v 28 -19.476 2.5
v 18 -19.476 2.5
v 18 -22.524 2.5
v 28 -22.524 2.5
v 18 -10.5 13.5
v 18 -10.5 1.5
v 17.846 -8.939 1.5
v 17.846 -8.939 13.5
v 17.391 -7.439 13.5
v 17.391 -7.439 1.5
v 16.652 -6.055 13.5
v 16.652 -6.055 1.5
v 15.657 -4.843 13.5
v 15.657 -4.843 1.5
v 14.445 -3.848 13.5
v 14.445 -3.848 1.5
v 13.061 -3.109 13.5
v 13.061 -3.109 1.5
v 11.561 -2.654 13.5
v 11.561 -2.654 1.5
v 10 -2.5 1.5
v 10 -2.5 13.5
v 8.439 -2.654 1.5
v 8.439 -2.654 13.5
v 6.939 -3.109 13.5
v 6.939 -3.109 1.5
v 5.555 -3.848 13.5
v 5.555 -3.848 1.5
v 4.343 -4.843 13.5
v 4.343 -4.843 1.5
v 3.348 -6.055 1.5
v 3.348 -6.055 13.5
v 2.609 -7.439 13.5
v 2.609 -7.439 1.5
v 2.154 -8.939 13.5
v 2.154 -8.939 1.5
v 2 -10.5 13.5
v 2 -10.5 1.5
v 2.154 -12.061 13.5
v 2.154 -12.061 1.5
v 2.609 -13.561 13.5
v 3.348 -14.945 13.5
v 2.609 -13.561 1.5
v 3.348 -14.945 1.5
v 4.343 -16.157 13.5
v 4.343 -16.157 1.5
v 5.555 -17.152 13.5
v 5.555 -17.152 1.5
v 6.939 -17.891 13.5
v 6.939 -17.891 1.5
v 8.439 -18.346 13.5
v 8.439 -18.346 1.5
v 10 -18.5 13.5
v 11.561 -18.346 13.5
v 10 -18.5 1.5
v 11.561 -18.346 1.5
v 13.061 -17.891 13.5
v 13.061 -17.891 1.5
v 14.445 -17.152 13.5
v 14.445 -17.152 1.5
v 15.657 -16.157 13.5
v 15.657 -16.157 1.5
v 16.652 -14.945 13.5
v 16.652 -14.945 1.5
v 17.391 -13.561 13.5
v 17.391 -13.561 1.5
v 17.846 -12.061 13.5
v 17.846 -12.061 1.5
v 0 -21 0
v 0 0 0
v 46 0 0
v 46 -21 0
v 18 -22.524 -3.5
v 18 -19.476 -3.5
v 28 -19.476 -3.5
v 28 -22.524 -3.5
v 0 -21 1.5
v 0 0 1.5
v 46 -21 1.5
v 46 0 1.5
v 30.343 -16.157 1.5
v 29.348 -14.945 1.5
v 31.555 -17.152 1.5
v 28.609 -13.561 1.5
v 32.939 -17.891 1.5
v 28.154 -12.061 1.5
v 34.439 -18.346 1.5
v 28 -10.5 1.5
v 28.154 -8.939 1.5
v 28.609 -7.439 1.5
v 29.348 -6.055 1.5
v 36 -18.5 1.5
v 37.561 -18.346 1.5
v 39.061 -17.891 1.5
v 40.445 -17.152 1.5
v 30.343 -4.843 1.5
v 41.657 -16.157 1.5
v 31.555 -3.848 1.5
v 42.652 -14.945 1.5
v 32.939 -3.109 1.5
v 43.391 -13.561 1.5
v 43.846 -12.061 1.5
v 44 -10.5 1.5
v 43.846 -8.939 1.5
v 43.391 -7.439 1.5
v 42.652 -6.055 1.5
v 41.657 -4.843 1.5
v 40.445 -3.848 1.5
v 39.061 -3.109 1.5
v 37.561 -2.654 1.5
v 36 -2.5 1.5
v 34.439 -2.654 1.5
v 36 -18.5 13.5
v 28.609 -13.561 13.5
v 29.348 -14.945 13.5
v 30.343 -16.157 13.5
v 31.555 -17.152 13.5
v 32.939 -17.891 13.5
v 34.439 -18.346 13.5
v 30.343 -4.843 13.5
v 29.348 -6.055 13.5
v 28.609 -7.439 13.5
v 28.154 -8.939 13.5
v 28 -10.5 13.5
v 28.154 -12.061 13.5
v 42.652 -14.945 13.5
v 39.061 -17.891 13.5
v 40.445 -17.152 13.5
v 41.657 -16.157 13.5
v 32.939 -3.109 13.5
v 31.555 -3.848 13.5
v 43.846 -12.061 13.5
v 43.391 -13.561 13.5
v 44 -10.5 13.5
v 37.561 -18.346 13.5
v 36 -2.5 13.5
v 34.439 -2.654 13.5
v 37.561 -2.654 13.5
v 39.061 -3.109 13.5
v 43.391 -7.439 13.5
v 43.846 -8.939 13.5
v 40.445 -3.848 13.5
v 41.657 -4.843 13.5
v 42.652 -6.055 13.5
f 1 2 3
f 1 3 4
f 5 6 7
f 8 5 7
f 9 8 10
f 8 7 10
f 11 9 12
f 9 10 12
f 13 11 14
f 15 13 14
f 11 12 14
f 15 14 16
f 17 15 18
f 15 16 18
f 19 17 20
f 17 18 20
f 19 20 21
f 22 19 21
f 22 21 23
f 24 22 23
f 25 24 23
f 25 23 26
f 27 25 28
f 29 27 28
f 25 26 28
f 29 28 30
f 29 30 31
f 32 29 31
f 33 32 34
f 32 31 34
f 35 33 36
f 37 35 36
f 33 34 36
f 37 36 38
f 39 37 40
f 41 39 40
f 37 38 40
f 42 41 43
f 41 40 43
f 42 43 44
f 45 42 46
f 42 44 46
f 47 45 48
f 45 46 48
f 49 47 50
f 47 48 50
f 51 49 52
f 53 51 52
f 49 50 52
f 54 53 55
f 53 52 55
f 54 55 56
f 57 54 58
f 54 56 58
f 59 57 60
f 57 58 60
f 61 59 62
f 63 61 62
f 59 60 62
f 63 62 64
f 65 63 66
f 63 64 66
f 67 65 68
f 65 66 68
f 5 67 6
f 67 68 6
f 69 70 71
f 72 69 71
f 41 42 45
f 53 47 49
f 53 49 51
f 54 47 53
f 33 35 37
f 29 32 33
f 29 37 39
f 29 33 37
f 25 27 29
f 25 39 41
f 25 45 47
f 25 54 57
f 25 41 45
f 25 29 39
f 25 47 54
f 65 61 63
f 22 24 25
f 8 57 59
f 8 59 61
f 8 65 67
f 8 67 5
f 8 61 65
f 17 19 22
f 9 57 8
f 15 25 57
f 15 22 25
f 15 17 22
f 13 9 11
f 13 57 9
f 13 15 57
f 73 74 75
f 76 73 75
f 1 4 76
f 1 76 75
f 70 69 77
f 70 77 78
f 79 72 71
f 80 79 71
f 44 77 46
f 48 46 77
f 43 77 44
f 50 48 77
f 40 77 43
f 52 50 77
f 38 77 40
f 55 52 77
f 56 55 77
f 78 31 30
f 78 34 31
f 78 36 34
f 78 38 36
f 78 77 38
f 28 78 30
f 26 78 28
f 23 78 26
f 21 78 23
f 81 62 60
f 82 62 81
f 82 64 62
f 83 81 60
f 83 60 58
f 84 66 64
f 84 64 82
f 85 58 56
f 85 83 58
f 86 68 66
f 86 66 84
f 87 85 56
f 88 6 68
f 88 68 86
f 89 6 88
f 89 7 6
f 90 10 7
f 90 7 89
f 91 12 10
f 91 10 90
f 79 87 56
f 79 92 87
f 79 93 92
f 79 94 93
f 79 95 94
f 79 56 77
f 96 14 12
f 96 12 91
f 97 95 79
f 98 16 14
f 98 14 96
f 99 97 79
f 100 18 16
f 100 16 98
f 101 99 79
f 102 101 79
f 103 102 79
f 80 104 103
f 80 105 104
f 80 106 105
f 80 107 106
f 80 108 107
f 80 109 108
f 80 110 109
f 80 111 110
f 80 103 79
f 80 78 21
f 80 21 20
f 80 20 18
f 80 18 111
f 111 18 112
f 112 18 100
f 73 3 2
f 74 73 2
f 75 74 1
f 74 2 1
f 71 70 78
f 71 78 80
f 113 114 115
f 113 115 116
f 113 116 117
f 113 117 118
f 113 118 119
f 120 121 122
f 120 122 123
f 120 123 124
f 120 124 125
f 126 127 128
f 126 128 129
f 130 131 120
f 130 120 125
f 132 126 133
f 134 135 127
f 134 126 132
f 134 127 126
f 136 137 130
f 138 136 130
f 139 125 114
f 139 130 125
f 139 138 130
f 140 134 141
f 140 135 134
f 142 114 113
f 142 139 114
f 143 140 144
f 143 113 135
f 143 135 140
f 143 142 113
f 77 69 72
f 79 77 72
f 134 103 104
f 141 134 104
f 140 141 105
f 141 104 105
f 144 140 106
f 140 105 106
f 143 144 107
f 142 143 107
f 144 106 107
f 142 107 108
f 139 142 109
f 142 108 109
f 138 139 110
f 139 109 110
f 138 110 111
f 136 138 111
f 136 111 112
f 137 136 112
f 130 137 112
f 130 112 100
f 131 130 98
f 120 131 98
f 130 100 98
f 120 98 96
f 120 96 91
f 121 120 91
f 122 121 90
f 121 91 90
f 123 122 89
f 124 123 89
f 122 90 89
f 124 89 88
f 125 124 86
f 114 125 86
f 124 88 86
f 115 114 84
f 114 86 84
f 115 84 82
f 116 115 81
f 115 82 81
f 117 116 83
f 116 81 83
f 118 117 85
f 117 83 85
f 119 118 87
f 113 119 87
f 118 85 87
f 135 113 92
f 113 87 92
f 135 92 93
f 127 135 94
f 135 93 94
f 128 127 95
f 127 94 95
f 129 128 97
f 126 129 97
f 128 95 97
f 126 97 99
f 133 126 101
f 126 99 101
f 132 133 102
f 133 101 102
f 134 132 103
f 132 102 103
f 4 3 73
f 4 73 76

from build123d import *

# Parameters (mm, degrees)
SKETCH_1_W           = 46
SKETCH_1_H           = 21
EXTRUDE_1_DEPTH      = 1.5
SKETCH_2_R           = 8
EXTRUDE_2_DEPTH      = 12
SKETCH_3_W           = 10
SKETCH_3_H           = 3.04885902
EXTRUDE_3_DEPTH      = 1
EXTRUDE_3_DEPTH_BACK = 5


with BuildPart() as part:
    # 草图1 → 凸台-拉伸1 (new body)
    with BuildSketch(Plane.XY):
        with Locations((23, -10.5)):
            Rectangle(SKETCH_1_W, SKETCH_1_H)
    extrude(amount=EXTRUDE_1_DEPTH)

    # 草图2 → 凸台-拉伸2 (add)
    with BuildSketch(Plane.XY.offset(1.5)):
        with Locations((10, -10.5)):
            Circle(SKETCH_2_R)
        with Locations((36, -10.5)):
            Circle(SKETCH_2_R)
    extrude(amount=EXTRUDE_2_DEPTH)


with BuildPart() as body_2:
    # 草图3 → 凸台-拉伸3 (new body, two sides)
    with BuildSketch(Plane.XY.offset(1.5)) as extrude_3_sk:
        with Locations((23, -21)):
            Rectangle(SKETCH_3_W, SKETCH_3_H)
    extrude(amount=EXTRUDE_3_DEPTH)
    extrude(extrude_3_sk.sketch, amount=-EXTRUDE_3_DEPTH_BACK)


solid = Compound([part.part, body_2.part])
